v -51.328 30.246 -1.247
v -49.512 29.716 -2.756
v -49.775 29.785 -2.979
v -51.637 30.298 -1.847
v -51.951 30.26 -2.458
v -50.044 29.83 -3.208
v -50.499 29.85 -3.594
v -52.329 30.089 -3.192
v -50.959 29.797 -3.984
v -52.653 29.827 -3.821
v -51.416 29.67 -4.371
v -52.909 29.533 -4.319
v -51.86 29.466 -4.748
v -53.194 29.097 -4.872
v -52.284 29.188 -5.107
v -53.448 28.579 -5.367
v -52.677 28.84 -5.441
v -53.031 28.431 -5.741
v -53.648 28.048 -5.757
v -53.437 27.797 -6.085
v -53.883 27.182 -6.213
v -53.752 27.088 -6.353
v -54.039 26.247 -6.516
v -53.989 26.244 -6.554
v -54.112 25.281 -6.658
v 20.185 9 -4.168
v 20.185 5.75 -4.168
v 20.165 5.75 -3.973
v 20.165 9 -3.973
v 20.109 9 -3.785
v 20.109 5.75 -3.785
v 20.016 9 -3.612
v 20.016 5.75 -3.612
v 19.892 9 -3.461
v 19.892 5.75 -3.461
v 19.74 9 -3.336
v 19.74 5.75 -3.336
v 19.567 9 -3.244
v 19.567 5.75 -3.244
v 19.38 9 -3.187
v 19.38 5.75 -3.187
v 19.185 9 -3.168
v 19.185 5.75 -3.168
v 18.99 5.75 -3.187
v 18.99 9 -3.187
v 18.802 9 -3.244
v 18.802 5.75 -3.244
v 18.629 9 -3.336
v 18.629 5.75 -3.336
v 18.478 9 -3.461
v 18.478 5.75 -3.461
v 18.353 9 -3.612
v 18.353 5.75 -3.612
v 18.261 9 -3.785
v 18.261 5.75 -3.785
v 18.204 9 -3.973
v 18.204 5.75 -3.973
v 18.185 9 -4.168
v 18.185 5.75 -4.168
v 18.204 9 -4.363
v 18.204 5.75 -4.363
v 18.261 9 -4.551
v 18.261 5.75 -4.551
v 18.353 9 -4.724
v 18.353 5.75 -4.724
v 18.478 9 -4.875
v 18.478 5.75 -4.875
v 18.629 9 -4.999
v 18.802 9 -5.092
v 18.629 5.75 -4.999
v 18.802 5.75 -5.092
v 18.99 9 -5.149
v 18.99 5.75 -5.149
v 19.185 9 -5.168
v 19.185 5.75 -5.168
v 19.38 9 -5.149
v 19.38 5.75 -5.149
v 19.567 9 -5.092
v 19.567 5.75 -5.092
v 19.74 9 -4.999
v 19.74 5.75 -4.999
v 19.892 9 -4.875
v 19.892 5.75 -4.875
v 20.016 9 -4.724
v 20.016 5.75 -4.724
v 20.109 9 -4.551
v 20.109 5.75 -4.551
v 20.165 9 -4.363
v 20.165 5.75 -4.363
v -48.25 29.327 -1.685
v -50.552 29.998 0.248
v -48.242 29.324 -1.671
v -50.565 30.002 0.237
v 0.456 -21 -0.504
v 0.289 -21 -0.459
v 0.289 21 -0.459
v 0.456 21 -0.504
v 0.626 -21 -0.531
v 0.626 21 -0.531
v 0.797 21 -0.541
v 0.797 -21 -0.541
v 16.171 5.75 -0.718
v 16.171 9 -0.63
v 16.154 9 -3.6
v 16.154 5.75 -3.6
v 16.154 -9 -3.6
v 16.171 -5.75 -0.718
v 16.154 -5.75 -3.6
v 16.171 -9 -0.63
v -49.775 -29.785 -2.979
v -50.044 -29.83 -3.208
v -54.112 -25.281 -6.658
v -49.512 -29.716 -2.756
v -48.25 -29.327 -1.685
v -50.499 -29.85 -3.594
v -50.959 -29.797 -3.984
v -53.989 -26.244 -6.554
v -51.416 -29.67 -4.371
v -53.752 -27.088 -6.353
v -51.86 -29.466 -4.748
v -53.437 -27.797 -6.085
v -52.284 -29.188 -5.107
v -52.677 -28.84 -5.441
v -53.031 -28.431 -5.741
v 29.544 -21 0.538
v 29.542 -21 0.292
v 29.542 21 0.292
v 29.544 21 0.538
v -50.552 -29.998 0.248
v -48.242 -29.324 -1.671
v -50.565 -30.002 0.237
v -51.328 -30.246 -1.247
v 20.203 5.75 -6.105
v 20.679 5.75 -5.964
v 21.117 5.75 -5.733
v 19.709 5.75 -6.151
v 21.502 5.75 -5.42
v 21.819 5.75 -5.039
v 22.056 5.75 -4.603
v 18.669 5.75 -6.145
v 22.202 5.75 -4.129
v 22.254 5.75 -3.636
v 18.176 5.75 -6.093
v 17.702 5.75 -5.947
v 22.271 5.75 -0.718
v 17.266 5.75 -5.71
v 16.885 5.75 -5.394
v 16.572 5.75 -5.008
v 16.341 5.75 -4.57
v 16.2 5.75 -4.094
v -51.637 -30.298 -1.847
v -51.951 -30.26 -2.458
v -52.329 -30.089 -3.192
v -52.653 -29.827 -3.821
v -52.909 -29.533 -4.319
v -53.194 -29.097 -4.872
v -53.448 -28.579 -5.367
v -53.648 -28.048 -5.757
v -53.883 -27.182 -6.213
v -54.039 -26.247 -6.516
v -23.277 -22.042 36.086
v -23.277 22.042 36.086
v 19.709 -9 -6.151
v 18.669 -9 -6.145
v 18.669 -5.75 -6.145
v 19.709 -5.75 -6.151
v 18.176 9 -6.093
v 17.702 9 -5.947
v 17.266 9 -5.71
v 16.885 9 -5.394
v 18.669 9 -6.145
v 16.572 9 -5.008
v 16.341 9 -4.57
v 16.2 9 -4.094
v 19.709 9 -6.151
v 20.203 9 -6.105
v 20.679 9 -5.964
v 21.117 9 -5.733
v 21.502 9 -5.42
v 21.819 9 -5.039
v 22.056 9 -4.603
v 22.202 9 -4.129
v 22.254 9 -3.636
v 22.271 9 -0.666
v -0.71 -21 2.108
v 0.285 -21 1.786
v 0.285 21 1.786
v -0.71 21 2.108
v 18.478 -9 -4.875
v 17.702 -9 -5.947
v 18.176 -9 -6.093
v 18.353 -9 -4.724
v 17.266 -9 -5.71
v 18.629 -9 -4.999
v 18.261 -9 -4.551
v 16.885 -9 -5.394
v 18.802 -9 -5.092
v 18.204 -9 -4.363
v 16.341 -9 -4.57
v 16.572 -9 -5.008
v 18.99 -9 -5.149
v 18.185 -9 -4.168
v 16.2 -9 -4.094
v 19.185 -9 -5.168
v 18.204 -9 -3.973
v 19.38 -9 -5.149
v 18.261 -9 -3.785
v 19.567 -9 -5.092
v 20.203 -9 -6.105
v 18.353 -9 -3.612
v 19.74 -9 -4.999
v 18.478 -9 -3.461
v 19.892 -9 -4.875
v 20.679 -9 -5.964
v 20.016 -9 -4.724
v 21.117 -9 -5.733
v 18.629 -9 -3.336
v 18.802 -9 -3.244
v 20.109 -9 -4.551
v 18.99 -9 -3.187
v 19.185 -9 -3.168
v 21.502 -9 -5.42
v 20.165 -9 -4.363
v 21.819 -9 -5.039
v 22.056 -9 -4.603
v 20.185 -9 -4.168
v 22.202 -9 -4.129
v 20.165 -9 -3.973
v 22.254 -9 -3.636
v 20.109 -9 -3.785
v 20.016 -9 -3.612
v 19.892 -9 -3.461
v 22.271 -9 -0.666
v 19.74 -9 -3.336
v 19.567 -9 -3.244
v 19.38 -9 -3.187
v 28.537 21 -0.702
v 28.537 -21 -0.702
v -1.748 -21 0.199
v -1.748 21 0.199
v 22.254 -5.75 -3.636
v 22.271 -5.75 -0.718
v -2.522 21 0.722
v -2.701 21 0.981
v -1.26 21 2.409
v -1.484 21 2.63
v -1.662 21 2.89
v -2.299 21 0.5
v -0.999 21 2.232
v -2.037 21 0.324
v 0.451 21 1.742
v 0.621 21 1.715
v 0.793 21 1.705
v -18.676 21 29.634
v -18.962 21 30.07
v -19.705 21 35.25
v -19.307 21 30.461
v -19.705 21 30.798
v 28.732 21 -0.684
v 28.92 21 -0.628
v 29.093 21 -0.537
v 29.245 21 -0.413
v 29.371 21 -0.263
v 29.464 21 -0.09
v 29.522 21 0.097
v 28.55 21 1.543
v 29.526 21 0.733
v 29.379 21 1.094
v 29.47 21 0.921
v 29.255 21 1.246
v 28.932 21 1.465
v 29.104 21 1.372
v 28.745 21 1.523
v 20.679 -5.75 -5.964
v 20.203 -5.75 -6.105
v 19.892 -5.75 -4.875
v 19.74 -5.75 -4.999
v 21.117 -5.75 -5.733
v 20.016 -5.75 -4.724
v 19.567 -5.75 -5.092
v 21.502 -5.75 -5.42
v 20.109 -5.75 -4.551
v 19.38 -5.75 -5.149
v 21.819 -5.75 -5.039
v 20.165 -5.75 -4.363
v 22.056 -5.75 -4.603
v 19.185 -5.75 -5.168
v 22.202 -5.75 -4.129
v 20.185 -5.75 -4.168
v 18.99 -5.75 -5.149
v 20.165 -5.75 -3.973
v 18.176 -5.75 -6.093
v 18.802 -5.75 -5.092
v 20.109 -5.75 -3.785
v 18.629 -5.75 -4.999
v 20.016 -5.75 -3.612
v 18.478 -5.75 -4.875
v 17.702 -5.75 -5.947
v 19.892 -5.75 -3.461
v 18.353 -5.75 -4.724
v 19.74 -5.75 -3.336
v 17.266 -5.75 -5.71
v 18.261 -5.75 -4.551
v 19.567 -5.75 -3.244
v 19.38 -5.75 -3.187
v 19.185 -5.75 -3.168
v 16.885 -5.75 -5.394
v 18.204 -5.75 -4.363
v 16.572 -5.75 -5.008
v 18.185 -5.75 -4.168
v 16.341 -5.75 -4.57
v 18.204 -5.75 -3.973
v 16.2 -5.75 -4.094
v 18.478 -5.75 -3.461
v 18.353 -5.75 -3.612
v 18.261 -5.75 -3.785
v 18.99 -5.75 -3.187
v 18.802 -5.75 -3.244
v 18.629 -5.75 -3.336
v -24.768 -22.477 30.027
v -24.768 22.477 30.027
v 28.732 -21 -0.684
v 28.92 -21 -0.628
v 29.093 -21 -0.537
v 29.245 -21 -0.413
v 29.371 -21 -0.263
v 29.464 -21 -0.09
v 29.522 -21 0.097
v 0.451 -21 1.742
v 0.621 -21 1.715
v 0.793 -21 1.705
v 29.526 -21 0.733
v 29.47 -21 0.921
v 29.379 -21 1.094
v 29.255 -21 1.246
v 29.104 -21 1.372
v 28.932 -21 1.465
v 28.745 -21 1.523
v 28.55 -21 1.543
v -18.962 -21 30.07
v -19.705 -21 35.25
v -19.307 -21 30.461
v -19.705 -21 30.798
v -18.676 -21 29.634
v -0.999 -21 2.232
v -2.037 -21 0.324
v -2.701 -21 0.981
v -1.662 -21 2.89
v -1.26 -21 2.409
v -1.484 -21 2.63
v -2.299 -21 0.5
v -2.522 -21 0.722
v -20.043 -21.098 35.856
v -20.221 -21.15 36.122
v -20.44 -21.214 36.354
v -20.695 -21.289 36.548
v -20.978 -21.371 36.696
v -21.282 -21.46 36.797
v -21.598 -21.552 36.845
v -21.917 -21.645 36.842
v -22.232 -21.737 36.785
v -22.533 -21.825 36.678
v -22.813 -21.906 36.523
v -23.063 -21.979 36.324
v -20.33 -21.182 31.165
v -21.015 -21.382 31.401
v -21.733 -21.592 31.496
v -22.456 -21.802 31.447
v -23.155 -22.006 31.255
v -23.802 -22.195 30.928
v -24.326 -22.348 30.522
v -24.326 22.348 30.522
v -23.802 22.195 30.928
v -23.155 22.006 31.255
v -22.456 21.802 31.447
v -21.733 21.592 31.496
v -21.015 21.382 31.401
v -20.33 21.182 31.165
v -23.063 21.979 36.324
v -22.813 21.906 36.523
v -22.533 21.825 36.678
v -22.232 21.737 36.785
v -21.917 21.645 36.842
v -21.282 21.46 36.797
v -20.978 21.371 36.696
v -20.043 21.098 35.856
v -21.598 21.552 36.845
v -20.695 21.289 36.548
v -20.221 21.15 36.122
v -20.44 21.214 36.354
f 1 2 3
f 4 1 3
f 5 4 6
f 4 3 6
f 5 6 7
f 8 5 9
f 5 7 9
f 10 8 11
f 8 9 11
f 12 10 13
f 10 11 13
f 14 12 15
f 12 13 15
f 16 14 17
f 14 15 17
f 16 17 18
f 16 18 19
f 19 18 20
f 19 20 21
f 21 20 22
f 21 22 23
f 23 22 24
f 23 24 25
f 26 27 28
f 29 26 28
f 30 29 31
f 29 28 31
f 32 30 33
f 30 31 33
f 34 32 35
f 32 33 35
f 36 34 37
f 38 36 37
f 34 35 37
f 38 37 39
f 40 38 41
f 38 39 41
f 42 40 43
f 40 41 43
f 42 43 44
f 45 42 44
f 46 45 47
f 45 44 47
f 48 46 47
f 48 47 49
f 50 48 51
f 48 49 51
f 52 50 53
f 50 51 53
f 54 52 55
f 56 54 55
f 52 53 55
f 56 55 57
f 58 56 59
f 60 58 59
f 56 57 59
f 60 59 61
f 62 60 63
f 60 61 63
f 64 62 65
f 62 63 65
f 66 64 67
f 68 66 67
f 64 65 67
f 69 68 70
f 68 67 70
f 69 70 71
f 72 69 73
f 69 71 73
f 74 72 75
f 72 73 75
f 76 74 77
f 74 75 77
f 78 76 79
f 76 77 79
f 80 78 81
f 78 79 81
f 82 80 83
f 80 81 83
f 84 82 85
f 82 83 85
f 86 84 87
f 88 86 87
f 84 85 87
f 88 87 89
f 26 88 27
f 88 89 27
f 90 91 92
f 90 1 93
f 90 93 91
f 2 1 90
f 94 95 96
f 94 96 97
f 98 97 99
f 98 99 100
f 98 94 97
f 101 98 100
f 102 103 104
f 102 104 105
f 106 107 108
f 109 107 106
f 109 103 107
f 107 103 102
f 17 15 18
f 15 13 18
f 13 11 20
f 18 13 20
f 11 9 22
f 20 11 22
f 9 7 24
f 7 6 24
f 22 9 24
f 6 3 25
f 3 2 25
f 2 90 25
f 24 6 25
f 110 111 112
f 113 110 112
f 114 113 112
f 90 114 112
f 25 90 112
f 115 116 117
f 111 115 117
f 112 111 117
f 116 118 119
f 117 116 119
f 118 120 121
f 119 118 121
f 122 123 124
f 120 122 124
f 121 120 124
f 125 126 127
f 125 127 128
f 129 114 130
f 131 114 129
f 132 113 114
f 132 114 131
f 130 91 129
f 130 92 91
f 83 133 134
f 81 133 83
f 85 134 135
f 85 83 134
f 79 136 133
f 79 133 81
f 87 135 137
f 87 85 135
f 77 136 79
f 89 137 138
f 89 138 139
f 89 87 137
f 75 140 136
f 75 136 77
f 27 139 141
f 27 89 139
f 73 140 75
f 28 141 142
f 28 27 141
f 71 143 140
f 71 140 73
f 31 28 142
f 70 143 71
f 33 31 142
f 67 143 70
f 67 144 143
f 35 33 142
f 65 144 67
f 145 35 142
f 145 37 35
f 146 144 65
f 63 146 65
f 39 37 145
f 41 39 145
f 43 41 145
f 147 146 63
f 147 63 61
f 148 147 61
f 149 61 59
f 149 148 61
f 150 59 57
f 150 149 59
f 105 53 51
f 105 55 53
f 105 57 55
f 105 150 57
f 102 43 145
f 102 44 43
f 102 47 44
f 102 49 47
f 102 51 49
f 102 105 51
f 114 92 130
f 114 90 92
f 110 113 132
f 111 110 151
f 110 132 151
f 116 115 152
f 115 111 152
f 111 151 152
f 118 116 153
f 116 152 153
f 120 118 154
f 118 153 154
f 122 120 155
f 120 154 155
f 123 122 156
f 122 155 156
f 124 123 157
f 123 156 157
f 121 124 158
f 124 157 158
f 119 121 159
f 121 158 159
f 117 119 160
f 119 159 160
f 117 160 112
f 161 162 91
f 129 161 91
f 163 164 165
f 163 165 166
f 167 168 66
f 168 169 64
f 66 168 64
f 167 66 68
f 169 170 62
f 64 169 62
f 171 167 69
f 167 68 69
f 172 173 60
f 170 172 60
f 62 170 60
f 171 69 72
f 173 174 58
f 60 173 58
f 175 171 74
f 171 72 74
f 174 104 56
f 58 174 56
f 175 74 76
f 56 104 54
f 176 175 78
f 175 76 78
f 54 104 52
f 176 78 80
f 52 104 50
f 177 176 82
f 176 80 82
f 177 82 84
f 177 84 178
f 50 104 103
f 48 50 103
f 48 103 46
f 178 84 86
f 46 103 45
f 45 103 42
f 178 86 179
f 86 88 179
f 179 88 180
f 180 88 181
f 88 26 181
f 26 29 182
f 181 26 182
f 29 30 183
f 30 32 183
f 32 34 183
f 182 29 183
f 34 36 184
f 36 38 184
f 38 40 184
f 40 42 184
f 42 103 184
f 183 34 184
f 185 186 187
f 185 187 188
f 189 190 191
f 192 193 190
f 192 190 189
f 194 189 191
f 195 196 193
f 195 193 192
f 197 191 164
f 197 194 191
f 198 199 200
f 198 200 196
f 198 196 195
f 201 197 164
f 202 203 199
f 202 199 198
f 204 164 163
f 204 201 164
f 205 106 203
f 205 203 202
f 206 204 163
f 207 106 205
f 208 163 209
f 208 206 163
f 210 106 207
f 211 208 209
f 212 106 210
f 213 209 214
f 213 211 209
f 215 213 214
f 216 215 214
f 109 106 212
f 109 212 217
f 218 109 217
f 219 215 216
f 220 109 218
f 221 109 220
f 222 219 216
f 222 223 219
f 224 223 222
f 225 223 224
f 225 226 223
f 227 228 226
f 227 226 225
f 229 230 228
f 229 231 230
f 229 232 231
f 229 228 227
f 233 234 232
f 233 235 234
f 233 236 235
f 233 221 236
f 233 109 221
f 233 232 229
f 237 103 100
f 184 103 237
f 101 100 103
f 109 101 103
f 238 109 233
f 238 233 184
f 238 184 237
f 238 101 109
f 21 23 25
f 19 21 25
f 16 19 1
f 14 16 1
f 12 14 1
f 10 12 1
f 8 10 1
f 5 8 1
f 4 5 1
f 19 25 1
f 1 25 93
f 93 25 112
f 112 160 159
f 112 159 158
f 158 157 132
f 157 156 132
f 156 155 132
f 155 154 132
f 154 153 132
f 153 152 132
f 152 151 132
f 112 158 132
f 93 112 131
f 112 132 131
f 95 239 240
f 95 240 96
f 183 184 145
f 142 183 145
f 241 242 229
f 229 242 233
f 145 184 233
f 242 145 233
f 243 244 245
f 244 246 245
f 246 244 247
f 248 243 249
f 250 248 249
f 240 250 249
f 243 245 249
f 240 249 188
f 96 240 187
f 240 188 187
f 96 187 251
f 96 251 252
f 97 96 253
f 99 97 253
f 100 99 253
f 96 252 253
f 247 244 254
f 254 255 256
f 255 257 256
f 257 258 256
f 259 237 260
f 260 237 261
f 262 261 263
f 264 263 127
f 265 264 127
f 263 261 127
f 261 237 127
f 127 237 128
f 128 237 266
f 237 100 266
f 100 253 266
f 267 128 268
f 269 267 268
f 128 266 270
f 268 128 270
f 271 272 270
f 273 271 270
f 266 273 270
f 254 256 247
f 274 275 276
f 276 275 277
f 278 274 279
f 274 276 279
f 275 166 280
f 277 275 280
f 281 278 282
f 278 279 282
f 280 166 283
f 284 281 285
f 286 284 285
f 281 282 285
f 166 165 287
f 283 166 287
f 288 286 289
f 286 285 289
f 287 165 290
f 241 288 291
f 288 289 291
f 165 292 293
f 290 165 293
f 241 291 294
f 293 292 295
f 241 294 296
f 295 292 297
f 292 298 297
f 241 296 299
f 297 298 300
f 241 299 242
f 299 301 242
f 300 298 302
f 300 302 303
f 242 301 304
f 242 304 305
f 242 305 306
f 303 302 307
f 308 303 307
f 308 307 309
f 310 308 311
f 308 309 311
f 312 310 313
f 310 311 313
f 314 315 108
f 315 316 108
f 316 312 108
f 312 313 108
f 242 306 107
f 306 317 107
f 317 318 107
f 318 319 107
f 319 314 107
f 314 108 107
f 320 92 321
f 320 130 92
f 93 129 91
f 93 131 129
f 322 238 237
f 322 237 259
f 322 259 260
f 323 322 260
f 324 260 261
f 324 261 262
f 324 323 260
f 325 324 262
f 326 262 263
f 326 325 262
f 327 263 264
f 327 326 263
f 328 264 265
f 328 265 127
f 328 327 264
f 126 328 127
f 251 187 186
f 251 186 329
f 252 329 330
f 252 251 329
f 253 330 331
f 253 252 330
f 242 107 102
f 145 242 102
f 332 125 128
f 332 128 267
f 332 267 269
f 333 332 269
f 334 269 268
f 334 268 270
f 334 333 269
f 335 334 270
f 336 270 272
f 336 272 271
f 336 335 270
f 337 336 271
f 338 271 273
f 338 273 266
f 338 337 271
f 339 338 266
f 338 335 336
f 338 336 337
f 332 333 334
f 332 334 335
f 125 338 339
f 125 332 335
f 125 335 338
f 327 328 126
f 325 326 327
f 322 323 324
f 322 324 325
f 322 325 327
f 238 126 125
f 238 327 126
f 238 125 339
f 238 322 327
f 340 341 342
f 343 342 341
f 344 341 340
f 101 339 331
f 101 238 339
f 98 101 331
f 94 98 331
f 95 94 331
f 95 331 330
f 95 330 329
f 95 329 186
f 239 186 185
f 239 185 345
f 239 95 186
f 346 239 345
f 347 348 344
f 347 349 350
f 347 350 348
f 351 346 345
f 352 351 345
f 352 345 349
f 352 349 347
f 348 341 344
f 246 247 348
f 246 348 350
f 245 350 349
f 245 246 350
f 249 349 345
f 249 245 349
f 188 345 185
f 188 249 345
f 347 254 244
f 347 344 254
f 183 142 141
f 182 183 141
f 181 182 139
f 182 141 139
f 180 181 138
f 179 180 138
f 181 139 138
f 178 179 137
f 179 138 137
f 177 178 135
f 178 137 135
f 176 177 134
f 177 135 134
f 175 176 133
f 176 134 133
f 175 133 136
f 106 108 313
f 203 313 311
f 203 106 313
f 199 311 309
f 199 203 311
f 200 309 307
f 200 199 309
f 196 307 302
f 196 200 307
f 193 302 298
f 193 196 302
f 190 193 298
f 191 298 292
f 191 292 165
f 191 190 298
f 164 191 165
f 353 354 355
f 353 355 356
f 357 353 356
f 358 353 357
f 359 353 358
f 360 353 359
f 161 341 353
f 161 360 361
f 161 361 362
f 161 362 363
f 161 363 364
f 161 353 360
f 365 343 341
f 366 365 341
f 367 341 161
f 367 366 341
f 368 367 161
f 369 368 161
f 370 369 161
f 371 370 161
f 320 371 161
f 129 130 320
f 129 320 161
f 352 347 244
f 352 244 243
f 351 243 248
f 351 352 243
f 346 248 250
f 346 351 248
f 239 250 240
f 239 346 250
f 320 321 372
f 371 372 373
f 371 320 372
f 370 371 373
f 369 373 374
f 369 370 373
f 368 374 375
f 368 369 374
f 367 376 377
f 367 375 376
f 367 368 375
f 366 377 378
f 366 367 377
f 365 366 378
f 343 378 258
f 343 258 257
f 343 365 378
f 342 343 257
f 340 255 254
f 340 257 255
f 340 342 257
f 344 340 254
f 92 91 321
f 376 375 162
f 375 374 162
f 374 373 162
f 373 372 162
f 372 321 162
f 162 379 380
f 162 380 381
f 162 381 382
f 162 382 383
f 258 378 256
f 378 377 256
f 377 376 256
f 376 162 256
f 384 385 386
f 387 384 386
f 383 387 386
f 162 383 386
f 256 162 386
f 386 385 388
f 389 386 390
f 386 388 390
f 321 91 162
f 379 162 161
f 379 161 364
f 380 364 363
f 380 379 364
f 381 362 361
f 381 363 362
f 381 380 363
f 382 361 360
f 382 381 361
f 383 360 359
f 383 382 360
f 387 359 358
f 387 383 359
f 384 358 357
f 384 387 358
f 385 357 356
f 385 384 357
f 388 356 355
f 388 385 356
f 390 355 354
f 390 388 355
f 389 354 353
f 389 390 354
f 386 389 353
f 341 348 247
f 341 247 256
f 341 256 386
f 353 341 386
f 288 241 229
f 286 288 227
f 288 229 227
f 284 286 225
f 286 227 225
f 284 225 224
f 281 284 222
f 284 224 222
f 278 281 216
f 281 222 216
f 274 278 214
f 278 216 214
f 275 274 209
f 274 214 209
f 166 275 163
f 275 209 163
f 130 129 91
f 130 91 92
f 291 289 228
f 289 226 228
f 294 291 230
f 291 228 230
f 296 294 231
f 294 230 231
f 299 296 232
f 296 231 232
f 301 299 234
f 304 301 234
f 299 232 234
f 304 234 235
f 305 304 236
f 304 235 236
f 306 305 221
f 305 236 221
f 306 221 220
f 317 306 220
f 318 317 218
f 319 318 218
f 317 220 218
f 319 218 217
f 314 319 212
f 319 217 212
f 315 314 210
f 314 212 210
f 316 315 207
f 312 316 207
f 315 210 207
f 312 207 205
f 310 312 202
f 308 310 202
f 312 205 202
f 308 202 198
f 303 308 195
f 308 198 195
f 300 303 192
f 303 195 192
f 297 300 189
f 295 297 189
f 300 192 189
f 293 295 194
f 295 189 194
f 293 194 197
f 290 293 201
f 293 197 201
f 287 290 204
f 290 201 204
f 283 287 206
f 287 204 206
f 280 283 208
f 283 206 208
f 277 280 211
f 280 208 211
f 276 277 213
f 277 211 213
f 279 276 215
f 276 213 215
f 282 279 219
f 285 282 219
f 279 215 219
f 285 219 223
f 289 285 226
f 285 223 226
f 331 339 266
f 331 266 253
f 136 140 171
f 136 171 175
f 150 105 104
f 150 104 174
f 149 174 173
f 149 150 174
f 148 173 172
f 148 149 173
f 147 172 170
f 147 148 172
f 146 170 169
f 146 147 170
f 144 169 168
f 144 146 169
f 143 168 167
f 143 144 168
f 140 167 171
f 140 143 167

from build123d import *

# Parameters (mm, degrees)
F1_DEPTH  = 30
F2_R      = 1.9372626165
F3_R      = 3.6323674058
F4_R      = 1.6835956322
F5_W      = 6.1
F5_H      = 18
F6_DEPTH  = 5.5
F7_R      = 2.53
F8_R      = 1
F9_DEPTH  = 12.5
F10_W     = 11.5
F10_H     = 5.4466048917
F11_DEPTH = 30.5
F12_R     = 1
F16_DEPTH = 51.6
F18_DEPTH = 7.6
F18_TAPER = -11.0007896665
F19_R     = 5
F21_DEPTH = 65.9


with BuildPart() as f1:
    # F0 (on Front) → F1 (new body, symmetric)
    with BuildSketch(Plane.XZ):
        Polygon((-21.4841543387, 38.441415643), (-50.5517522, 0.2476171236), (-48.2417419553, -1.6707489267), (-21.4177053502, 34.551171923), (-2.3782219554, 0.4027119112), (0.5371333221, -0.539442296), (29.5366433894, -0.7080123418), (29.5496972348, 1.5376720665), (0.5325847111, 1.706344433), (-1.3398946671, 2.3114728499), align=None)
    extrude(amount=F1_DEPTH, both=True)

    # F2
    f2_edges = [f1.edges().sort_by_distance(p)[0] for p in [
        (-21.484154, 0, 38.441416),
    ]]
    fillet(f2_edges, radius=F2_R)

    # F3
    f3_edges = [f1.edges().sort_by_distance(p)[0] for p in [
        (-21.417705, 0, 34.551172),
    ]]
    fillet(f3_edges, radius=F3_R)

    # F4
    f4_edges = [f1.edges().sort_by_distance(p)[0] for p in [
        (-2.378222, 0, 0.402712),
        (0.537133, 0, -0.539442),
        (-1.339895, 0, 2.311473),
        (0.532585, 0, 1.706344),
    ]]
    fillet(f4_edges, radius=F4_R)

    # F5 (on face) → F6 (join)
    with BuildSketch(Plane(origin=(-0.003117447, 0, -0.5363018947), x_dir=(0.9999831058, 0, -0.0058127602), z_dir=(-0.0058127602, 0, -0.9999831058))):
        with Locations((19.224634394, 0)):
            Rectangle(F5_W, F5_H)
    extrude(amount=F6_DEPTH)

    # F7
    f7_edges = [f1.edges().sort_by_distance(p)[0] for p in [
        (16.139274, 0, -6.130228),
        (22.23917, 0, -6.165686),
    ]]
    fillet(f7_edges, radius=F7_R)

    # F8 (on Front) → F9 (cut, symmetric)
    with BuildSketch(Plane.XZ):
        with Locations((19.1846575089, -4.1679624274)):
            Circle(F8_R)
    extrude(amount=F9_DEPTH, both=True, mode=Mode.SUBTRACT)

    # F10 (on Right) → F11 (cut)
    with BuildSketch(Plane.YZ):
        with Locations((0, -3.4415810369)):
            Rectangle(F10_W, F10_H)
    extrude(amount=F11_DEPTH, mode=Mode.SUBTRACT)

    # F12
    f12_edges = [f1.edges().sort_by_distance(p)[0] for p in [
        (29.549697, 0, 1.537672),
        (29.536643, 0, -0.708012),
    ]]
    fillet(f12_edges, radius=F12_R)

    # F15 (on Top) → F16 (cut, symmetric)
    with BuildSketch(Plane.XY):
        Polygon((36.6469656572, -30.0679765642), (36.1767635131, -20.9998395294), (-19.7048801929, -20.9998395294), (-50.7905334234, -30.0679765642), align=None)
        Polygon((-19.7048801929, 20.9998395294), (36.1767635131, 20.9998395294), (36.6469656572, 30.0679765642), (-50.7905334234, 30.0679765642), align=None)
    extrude(amount=F16_DEPTH, both=True, mode=Mode.SUBTRACT)


with BuildPart() as f18:
    # F17 (on face) → F18 (new body)
    with BuildSketch(Plane(origin=(-20.5117545018, 0, -24.6993335959), x_dir=(0.7693081193, 0, -0.6388779364), z_dir=(-0.6388779364, 0, -0.7693081193))):
        Polygon((-39.0480705273, -29.9983206094), (-36.0453591469, -29.3244570333), (-36.0453591469, 29.3244570333), (-39.0480705273, 29.9983206094), align=None)
    extrude(amount=F18_DEPTH, taper=F18_TAPER)

    # F19
    f19_edges = [f18.edges().sort_by_distance(p)[0] for p in [
        (-54.252219, 31.175534, -6.558308),
        (-54.252219, -31.175534, -6.558308),
    ]]
    fillet(f19_edges, radius=F19_R)

    # F20 (on offset) → F21 (cut, symmetric)
    with BuildSketch(Plane.XZ.offset(-21)):
        Polygon((-54.112419486, -6.658335682), (-50.3190383315, 0.7145153941), (-53.9081059396, 1.3606360881), (-57.6216615736, -5.0401142798), (-52.1909035742, -10.3187263012), (-44.9881106615, -4.8535033129), (-47.8707328439, -1.363902702), align=None)
    extrude(amount=F21_DEPTH, both=True, mode=Mode.SUBTRACT)


solid = Compound([f1.part, f18.part])
